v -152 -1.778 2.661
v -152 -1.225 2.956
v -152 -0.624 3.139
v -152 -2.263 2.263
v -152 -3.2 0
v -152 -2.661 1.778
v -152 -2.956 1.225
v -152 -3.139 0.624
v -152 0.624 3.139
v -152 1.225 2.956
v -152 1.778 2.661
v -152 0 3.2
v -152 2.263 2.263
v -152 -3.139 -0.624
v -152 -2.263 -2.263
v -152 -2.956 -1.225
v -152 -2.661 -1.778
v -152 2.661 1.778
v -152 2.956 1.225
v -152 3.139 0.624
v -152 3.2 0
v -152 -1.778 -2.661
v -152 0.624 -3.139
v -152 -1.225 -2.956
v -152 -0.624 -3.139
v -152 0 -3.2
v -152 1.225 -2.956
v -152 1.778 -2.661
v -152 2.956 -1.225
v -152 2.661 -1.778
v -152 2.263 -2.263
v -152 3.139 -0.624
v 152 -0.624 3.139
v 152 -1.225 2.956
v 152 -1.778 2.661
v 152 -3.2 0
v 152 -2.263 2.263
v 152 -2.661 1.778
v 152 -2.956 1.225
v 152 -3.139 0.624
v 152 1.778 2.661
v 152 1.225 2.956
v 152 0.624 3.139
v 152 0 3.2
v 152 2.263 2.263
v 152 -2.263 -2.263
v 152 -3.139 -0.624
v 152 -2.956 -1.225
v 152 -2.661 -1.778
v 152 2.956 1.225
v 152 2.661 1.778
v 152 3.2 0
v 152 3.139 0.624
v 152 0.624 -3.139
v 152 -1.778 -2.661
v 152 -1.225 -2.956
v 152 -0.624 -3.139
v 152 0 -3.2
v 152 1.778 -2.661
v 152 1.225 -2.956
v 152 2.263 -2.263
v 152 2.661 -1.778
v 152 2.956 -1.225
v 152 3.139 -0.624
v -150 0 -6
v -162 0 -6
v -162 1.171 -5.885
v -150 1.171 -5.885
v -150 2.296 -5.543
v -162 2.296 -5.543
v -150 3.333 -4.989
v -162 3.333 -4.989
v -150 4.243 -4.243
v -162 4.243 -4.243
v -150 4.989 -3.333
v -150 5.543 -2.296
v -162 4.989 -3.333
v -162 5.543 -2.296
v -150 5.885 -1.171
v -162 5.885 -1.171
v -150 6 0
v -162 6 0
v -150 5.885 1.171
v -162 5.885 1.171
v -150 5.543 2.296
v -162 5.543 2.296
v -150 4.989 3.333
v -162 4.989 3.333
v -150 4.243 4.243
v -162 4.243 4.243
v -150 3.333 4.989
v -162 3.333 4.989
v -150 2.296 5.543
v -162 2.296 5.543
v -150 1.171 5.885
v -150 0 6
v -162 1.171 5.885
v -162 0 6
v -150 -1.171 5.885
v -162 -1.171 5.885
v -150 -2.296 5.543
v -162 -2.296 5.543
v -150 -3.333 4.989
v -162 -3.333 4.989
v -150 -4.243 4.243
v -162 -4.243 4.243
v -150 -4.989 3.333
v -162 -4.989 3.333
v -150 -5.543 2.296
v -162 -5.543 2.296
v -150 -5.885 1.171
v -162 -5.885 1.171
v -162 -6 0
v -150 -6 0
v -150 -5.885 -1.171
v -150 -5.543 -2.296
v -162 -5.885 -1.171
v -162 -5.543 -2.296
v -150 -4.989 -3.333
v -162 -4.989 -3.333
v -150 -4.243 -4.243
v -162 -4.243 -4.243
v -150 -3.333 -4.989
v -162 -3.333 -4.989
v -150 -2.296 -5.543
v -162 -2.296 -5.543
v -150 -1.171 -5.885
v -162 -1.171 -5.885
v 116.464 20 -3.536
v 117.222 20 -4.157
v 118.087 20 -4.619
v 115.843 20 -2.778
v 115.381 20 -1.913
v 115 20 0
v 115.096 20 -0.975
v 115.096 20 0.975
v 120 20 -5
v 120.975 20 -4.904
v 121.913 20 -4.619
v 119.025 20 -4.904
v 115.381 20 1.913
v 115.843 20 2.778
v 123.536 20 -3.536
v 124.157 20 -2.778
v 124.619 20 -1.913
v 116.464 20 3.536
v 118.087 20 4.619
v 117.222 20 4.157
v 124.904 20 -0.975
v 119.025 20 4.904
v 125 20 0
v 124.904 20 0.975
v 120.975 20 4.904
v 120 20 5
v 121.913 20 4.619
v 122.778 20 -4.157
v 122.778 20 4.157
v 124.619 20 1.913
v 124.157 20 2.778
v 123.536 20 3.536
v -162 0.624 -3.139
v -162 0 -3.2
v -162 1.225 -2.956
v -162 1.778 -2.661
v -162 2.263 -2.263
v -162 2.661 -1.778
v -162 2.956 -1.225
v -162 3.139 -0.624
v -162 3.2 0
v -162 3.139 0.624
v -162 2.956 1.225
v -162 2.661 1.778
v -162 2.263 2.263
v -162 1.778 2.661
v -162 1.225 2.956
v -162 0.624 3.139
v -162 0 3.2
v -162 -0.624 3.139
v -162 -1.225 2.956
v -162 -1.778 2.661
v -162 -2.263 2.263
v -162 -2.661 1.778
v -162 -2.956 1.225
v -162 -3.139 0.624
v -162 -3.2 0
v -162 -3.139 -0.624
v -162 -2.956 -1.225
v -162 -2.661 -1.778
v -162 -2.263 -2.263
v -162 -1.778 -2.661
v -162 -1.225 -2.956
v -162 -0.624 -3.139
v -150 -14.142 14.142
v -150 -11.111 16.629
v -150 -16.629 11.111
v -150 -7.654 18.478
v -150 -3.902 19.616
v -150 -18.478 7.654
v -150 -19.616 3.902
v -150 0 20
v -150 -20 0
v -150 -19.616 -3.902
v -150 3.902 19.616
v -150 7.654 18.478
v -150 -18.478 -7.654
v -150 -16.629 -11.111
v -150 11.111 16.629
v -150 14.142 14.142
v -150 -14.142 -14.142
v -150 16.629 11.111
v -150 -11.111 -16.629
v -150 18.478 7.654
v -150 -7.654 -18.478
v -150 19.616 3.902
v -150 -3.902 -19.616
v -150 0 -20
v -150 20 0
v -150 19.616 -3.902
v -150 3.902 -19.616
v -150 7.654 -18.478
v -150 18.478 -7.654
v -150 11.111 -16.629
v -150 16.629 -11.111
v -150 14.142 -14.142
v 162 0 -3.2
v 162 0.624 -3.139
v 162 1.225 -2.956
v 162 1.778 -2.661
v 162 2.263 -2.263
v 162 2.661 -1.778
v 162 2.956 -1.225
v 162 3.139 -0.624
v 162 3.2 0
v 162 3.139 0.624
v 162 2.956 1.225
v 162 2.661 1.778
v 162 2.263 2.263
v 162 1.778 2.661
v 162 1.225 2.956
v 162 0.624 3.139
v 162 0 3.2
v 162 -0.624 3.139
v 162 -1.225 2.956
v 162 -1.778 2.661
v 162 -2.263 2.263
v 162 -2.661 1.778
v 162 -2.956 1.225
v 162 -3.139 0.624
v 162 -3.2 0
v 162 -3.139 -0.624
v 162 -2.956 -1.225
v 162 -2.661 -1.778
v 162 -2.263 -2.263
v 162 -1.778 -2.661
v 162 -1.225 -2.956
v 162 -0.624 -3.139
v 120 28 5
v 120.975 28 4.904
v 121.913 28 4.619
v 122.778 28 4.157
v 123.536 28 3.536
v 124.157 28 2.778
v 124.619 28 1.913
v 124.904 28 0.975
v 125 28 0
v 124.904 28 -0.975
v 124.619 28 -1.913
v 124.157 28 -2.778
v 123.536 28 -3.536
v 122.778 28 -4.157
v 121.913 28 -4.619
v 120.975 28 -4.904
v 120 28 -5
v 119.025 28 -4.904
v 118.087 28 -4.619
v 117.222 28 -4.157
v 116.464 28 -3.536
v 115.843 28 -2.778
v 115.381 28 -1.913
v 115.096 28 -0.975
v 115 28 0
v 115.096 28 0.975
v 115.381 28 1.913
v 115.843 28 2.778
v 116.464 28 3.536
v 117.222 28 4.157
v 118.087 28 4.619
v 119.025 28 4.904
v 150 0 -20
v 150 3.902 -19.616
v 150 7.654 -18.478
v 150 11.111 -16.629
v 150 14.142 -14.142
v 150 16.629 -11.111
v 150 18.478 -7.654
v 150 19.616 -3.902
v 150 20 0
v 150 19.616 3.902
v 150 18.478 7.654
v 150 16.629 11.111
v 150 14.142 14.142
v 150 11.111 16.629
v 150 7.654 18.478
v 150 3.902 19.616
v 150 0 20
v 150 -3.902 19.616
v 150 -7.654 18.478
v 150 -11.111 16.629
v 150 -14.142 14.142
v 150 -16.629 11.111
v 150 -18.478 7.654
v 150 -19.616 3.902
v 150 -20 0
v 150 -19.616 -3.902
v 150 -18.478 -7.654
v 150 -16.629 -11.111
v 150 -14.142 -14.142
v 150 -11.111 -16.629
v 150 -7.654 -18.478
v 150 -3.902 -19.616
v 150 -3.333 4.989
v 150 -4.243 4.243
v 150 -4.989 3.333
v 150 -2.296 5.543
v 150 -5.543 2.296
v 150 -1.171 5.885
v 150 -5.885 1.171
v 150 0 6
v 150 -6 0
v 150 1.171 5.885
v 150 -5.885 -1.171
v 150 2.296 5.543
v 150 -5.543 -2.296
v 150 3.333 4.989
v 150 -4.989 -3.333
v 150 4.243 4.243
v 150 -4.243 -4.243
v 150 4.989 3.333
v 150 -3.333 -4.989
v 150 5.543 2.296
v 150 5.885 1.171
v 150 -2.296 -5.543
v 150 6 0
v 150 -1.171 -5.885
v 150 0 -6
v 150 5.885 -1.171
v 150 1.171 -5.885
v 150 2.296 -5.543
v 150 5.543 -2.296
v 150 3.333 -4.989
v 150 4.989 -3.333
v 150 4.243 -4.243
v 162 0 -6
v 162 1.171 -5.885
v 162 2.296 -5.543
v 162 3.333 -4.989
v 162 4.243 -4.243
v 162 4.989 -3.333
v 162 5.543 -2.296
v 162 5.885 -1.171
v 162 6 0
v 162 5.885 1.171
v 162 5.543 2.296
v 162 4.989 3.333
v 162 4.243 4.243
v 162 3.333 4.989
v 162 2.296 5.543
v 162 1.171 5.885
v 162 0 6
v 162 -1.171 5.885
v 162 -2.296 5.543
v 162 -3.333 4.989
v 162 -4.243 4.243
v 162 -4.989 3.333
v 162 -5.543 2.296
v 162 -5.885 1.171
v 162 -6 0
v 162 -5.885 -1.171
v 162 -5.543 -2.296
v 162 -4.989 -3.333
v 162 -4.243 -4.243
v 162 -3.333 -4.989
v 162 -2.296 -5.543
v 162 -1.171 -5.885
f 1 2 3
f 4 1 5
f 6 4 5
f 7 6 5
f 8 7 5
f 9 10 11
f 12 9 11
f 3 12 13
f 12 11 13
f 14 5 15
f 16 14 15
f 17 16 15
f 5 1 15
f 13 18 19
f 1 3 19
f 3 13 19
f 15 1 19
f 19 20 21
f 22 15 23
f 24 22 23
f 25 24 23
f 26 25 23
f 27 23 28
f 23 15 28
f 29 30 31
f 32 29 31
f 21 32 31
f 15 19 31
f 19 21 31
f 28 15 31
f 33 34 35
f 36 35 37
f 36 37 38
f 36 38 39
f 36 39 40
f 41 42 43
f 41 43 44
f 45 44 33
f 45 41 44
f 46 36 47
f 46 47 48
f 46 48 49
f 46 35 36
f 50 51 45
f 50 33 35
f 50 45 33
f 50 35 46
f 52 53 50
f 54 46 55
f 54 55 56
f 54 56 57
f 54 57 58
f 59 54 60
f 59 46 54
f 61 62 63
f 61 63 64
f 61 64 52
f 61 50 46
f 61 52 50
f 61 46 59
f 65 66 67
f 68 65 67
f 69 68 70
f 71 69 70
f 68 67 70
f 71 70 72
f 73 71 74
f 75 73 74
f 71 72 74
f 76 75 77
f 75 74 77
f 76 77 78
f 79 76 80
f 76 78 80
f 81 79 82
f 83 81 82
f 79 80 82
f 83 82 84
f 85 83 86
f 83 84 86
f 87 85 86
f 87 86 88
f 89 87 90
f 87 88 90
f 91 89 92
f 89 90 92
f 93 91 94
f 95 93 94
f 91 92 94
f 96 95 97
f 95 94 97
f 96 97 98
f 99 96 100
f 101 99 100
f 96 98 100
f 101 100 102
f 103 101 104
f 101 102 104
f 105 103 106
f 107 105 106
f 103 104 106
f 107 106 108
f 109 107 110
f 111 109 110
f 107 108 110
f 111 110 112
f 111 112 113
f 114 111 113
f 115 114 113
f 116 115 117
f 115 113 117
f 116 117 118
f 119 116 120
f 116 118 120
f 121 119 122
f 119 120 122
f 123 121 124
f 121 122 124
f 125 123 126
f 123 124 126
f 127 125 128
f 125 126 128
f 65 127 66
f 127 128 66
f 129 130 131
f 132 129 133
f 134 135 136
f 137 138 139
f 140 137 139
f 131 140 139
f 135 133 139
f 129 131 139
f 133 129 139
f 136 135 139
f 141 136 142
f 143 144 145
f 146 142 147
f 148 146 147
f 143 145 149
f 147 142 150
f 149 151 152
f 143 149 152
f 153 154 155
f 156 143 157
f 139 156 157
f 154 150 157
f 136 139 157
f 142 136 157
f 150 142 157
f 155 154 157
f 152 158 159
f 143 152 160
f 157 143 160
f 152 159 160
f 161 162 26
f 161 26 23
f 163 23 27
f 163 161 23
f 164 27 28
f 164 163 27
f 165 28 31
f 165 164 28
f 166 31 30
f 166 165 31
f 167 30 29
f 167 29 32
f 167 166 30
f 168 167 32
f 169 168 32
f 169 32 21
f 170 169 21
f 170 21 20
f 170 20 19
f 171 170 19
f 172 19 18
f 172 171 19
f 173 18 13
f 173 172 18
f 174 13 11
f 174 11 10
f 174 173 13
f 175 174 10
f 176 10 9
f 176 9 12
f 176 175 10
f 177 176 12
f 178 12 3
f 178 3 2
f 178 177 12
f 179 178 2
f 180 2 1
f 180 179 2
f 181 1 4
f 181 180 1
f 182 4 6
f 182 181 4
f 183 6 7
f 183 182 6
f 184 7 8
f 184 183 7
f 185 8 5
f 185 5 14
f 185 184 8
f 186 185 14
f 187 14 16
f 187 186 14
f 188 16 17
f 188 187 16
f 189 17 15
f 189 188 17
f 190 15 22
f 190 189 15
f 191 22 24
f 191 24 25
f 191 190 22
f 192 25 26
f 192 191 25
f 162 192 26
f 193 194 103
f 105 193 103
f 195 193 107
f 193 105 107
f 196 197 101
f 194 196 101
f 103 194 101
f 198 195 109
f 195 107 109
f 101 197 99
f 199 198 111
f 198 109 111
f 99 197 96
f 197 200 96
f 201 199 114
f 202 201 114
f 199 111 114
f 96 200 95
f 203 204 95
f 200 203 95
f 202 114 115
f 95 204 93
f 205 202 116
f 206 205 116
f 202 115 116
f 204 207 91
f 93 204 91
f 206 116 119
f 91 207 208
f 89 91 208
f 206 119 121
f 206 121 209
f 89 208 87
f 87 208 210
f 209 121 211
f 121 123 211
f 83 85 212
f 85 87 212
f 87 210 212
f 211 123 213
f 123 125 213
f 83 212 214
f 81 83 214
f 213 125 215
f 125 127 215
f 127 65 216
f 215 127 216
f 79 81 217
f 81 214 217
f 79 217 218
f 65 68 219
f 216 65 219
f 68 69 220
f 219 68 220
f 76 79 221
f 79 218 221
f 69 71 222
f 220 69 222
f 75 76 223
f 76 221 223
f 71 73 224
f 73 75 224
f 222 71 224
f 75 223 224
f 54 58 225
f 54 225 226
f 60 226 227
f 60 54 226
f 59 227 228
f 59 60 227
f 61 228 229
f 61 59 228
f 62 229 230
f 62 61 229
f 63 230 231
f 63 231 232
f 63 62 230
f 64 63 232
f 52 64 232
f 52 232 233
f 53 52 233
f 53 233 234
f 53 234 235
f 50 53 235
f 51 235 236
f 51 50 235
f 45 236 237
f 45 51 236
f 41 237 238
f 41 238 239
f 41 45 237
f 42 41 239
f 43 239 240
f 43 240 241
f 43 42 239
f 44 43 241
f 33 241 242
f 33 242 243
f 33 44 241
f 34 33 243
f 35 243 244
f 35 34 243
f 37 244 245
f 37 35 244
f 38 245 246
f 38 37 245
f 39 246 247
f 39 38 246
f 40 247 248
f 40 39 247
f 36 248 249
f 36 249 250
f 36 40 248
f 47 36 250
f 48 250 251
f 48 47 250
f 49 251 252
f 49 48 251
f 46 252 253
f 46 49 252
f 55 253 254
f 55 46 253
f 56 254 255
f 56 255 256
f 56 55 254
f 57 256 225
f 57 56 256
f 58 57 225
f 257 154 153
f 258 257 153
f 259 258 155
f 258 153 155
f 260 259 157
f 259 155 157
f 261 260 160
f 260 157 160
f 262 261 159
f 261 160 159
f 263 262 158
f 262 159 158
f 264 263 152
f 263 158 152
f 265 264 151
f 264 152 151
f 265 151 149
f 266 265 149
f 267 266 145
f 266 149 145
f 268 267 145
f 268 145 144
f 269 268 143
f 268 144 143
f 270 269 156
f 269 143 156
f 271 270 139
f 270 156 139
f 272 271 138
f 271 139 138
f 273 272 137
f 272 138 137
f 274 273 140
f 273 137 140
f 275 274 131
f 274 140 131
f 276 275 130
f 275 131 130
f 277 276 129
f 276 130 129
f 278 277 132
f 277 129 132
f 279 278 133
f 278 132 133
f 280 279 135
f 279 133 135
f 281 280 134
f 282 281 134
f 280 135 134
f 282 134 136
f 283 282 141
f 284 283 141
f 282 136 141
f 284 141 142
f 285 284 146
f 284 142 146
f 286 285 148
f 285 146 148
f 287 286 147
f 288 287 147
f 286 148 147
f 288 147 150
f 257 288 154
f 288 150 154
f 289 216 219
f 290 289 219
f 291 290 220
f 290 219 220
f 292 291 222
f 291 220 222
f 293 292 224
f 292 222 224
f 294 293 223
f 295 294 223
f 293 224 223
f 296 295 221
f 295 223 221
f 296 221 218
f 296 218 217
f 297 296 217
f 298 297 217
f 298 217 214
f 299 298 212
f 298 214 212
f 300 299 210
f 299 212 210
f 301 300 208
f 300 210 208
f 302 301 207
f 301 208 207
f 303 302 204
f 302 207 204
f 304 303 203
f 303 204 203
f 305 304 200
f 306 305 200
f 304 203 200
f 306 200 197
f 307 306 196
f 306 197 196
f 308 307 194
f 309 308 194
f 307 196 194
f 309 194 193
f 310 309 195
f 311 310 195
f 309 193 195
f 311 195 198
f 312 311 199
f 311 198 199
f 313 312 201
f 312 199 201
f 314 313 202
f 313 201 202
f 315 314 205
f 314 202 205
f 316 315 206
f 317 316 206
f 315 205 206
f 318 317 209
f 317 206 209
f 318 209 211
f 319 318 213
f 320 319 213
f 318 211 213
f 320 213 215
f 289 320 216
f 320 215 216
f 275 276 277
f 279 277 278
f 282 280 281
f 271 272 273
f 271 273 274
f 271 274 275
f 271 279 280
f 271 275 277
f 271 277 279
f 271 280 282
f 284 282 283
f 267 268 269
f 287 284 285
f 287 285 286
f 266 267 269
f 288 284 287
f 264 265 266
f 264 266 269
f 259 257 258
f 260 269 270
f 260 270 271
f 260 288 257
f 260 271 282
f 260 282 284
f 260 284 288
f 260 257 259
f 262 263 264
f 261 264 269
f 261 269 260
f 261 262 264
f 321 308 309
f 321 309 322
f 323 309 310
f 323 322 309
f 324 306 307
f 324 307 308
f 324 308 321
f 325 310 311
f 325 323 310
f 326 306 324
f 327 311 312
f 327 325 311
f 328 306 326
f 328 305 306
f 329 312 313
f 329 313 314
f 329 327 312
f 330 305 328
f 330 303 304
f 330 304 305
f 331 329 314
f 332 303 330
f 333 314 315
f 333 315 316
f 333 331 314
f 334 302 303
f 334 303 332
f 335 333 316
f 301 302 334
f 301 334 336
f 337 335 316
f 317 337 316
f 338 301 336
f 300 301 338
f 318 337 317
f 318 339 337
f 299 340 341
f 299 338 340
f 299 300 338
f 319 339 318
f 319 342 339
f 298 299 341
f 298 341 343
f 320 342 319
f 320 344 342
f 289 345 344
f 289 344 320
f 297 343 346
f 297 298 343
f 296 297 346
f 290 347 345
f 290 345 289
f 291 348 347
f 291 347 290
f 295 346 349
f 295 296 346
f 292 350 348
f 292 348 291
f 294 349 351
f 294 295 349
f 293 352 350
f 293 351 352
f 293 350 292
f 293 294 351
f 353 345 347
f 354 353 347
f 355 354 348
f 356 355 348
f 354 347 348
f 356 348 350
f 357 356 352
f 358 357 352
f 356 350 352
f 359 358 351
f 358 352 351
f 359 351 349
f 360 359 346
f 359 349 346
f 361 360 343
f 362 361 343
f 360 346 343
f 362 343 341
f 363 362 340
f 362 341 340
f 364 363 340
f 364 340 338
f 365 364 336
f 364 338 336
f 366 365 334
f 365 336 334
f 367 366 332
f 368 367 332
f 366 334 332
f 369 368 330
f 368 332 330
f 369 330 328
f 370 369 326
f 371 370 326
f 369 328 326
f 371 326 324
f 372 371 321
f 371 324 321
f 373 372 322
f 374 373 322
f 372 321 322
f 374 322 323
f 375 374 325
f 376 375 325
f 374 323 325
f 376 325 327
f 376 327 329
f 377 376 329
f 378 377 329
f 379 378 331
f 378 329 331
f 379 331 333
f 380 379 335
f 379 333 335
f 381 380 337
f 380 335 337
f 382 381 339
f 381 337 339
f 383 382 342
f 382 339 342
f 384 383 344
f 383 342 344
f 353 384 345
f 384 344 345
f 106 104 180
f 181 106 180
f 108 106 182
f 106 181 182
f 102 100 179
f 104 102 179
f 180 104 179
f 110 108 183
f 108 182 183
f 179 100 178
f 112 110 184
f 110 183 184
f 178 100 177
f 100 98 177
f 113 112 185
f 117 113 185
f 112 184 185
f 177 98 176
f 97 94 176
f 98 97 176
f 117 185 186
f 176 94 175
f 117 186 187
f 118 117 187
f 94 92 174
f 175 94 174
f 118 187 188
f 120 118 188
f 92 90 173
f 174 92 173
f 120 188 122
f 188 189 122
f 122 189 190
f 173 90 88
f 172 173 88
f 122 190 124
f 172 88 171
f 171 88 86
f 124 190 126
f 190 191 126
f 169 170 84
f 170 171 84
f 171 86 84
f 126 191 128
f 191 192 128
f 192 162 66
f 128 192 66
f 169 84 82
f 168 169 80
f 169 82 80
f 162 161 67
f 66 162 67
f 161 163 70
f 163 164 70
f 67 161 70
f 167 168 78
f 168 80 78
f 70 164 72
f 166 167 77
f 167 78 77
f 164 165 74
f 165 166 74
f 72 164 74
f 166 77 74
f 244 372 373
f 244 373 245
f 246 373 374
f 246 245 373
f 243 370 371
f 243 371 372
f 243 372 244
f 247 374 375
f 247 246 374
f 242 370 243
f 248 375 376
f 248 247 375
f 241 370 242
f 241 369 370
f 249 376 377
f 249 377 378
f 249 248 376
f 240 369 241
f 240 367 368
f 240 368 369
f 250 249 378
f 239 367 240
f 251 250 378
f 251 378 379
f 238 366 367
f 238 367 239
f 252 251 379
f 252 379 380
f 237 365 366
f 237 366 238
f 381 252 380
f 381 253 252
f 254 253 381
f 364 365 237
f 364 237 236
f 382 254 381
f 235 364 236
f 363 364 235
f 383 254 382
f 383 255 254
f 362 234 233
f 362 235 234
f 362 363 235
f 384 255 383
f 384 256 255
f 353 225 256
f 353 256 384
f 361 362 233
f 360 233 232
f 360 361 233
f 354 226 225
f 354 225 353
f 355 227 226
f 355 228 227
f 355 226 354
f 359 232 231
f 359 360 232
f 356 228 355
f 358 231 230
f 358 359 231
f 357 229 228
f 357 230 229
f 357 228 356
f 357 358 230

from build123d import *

# Parameters (mm, degrees)
BODY_START             = -150
SKETCH1_R              = 20
BODY_DEPTH             = 300
INLET_PORT_START       = -162
SKETCH2_R              = 6
INLET_PORT_DEPTH       = 12
INLET_SOCKET_START     = -162
SKETCH3_R              = 3.2
INLET_SOCKET_DEPTH     = 10
OUTLET_PORT_START      = 150
SKETCH4_R              = 6
OUTLET_PORT_DEPTH      = 12
OUTLET_SOCKET_START    = 152
SKETCH5_R              = 3.2
OUTLET_SOCKET_DEPTH    = 10
LAMP_CABLE_GLAND_START = 20
SKETCH6_R              = 5
LAMP_CABLE_GLAND_DEPTH = 8


with BuildPart() as part:
    # Sketch1 → Body (new body)
    with BuildSketch(Plane(origin=(0, 0, 0), x_dir=(0, 0, -1), z_dir=(1, 0, 0)).offset(BODY_START)):
        Circle(SKETCH1_R)
    extrude(amount=BODY_DEPTH)

    # Sketch2 → Inlet_Port (add)
    with BuildSketch(Plane(origin=(0, 0, 0), x_dir=(0, 0, -1), z_dir=(1, 0, 0)).offset(INLET_PORT_START)):
        Circle(SKETCH2_R)
    extrude(amount=INLET_PORT_DEPTH)

    # Sketch3 → Inlet_Socket (cut)
    with BuildSketch(Plane(origin=(0, 0, 0), x_dir=(0, 0, -1), z_dir=(1, 0, 0)).offset(INLET_SOCKET_START)):
        Circle(SKETCH3_R)
    extrude(amount=INLET_SOCKET_DEPTH, mode=Mode.SUBTRACT)

    # Sketch4 → Outlet_Port (add)
    with BuildSketch(Plane(origin=(0, 0, 0), x_dir=(0, 0, -1), z_dir=(1, 0, 0)).offset(OUTLET_PORT_START)):
        Circle(SKETCH4_R)
    extrude(amount=OUTLET_PORT_DEPTH)

    # Sketch5 → Outlet_Socket (cut)
    with BuildSketch(Plane(origin=(0, 0, 0), x_dir=(0, 0, -1), z_dir=(1, 0, 0)).offset(OUTLET_SOCKET_START)):
        Circle(SKETCH5_R)
    extrude(amount=OUTLET_SOCKET_DEPTH, mode=Mode.SUBTRACT)


with BuildPart() as body_2:
    # Sketch6 → Lamp_Cable_Gland (new body)
    with BuildSketch(Plane(origin=(0, 0, 0), x_dir=(1, 0, 0), z_dir=(0, 1, 0)).offset(LAMP_CABLE_GLAND_START)):
        with Locations(Location((120, 0, 0), (0, 0, 270))):
            Circle(SKETCH6_R)
    extrude(amount=LAMP_CABLE_GLAND_DEPTH)


solid = Compound([part.part, body_2.part])
